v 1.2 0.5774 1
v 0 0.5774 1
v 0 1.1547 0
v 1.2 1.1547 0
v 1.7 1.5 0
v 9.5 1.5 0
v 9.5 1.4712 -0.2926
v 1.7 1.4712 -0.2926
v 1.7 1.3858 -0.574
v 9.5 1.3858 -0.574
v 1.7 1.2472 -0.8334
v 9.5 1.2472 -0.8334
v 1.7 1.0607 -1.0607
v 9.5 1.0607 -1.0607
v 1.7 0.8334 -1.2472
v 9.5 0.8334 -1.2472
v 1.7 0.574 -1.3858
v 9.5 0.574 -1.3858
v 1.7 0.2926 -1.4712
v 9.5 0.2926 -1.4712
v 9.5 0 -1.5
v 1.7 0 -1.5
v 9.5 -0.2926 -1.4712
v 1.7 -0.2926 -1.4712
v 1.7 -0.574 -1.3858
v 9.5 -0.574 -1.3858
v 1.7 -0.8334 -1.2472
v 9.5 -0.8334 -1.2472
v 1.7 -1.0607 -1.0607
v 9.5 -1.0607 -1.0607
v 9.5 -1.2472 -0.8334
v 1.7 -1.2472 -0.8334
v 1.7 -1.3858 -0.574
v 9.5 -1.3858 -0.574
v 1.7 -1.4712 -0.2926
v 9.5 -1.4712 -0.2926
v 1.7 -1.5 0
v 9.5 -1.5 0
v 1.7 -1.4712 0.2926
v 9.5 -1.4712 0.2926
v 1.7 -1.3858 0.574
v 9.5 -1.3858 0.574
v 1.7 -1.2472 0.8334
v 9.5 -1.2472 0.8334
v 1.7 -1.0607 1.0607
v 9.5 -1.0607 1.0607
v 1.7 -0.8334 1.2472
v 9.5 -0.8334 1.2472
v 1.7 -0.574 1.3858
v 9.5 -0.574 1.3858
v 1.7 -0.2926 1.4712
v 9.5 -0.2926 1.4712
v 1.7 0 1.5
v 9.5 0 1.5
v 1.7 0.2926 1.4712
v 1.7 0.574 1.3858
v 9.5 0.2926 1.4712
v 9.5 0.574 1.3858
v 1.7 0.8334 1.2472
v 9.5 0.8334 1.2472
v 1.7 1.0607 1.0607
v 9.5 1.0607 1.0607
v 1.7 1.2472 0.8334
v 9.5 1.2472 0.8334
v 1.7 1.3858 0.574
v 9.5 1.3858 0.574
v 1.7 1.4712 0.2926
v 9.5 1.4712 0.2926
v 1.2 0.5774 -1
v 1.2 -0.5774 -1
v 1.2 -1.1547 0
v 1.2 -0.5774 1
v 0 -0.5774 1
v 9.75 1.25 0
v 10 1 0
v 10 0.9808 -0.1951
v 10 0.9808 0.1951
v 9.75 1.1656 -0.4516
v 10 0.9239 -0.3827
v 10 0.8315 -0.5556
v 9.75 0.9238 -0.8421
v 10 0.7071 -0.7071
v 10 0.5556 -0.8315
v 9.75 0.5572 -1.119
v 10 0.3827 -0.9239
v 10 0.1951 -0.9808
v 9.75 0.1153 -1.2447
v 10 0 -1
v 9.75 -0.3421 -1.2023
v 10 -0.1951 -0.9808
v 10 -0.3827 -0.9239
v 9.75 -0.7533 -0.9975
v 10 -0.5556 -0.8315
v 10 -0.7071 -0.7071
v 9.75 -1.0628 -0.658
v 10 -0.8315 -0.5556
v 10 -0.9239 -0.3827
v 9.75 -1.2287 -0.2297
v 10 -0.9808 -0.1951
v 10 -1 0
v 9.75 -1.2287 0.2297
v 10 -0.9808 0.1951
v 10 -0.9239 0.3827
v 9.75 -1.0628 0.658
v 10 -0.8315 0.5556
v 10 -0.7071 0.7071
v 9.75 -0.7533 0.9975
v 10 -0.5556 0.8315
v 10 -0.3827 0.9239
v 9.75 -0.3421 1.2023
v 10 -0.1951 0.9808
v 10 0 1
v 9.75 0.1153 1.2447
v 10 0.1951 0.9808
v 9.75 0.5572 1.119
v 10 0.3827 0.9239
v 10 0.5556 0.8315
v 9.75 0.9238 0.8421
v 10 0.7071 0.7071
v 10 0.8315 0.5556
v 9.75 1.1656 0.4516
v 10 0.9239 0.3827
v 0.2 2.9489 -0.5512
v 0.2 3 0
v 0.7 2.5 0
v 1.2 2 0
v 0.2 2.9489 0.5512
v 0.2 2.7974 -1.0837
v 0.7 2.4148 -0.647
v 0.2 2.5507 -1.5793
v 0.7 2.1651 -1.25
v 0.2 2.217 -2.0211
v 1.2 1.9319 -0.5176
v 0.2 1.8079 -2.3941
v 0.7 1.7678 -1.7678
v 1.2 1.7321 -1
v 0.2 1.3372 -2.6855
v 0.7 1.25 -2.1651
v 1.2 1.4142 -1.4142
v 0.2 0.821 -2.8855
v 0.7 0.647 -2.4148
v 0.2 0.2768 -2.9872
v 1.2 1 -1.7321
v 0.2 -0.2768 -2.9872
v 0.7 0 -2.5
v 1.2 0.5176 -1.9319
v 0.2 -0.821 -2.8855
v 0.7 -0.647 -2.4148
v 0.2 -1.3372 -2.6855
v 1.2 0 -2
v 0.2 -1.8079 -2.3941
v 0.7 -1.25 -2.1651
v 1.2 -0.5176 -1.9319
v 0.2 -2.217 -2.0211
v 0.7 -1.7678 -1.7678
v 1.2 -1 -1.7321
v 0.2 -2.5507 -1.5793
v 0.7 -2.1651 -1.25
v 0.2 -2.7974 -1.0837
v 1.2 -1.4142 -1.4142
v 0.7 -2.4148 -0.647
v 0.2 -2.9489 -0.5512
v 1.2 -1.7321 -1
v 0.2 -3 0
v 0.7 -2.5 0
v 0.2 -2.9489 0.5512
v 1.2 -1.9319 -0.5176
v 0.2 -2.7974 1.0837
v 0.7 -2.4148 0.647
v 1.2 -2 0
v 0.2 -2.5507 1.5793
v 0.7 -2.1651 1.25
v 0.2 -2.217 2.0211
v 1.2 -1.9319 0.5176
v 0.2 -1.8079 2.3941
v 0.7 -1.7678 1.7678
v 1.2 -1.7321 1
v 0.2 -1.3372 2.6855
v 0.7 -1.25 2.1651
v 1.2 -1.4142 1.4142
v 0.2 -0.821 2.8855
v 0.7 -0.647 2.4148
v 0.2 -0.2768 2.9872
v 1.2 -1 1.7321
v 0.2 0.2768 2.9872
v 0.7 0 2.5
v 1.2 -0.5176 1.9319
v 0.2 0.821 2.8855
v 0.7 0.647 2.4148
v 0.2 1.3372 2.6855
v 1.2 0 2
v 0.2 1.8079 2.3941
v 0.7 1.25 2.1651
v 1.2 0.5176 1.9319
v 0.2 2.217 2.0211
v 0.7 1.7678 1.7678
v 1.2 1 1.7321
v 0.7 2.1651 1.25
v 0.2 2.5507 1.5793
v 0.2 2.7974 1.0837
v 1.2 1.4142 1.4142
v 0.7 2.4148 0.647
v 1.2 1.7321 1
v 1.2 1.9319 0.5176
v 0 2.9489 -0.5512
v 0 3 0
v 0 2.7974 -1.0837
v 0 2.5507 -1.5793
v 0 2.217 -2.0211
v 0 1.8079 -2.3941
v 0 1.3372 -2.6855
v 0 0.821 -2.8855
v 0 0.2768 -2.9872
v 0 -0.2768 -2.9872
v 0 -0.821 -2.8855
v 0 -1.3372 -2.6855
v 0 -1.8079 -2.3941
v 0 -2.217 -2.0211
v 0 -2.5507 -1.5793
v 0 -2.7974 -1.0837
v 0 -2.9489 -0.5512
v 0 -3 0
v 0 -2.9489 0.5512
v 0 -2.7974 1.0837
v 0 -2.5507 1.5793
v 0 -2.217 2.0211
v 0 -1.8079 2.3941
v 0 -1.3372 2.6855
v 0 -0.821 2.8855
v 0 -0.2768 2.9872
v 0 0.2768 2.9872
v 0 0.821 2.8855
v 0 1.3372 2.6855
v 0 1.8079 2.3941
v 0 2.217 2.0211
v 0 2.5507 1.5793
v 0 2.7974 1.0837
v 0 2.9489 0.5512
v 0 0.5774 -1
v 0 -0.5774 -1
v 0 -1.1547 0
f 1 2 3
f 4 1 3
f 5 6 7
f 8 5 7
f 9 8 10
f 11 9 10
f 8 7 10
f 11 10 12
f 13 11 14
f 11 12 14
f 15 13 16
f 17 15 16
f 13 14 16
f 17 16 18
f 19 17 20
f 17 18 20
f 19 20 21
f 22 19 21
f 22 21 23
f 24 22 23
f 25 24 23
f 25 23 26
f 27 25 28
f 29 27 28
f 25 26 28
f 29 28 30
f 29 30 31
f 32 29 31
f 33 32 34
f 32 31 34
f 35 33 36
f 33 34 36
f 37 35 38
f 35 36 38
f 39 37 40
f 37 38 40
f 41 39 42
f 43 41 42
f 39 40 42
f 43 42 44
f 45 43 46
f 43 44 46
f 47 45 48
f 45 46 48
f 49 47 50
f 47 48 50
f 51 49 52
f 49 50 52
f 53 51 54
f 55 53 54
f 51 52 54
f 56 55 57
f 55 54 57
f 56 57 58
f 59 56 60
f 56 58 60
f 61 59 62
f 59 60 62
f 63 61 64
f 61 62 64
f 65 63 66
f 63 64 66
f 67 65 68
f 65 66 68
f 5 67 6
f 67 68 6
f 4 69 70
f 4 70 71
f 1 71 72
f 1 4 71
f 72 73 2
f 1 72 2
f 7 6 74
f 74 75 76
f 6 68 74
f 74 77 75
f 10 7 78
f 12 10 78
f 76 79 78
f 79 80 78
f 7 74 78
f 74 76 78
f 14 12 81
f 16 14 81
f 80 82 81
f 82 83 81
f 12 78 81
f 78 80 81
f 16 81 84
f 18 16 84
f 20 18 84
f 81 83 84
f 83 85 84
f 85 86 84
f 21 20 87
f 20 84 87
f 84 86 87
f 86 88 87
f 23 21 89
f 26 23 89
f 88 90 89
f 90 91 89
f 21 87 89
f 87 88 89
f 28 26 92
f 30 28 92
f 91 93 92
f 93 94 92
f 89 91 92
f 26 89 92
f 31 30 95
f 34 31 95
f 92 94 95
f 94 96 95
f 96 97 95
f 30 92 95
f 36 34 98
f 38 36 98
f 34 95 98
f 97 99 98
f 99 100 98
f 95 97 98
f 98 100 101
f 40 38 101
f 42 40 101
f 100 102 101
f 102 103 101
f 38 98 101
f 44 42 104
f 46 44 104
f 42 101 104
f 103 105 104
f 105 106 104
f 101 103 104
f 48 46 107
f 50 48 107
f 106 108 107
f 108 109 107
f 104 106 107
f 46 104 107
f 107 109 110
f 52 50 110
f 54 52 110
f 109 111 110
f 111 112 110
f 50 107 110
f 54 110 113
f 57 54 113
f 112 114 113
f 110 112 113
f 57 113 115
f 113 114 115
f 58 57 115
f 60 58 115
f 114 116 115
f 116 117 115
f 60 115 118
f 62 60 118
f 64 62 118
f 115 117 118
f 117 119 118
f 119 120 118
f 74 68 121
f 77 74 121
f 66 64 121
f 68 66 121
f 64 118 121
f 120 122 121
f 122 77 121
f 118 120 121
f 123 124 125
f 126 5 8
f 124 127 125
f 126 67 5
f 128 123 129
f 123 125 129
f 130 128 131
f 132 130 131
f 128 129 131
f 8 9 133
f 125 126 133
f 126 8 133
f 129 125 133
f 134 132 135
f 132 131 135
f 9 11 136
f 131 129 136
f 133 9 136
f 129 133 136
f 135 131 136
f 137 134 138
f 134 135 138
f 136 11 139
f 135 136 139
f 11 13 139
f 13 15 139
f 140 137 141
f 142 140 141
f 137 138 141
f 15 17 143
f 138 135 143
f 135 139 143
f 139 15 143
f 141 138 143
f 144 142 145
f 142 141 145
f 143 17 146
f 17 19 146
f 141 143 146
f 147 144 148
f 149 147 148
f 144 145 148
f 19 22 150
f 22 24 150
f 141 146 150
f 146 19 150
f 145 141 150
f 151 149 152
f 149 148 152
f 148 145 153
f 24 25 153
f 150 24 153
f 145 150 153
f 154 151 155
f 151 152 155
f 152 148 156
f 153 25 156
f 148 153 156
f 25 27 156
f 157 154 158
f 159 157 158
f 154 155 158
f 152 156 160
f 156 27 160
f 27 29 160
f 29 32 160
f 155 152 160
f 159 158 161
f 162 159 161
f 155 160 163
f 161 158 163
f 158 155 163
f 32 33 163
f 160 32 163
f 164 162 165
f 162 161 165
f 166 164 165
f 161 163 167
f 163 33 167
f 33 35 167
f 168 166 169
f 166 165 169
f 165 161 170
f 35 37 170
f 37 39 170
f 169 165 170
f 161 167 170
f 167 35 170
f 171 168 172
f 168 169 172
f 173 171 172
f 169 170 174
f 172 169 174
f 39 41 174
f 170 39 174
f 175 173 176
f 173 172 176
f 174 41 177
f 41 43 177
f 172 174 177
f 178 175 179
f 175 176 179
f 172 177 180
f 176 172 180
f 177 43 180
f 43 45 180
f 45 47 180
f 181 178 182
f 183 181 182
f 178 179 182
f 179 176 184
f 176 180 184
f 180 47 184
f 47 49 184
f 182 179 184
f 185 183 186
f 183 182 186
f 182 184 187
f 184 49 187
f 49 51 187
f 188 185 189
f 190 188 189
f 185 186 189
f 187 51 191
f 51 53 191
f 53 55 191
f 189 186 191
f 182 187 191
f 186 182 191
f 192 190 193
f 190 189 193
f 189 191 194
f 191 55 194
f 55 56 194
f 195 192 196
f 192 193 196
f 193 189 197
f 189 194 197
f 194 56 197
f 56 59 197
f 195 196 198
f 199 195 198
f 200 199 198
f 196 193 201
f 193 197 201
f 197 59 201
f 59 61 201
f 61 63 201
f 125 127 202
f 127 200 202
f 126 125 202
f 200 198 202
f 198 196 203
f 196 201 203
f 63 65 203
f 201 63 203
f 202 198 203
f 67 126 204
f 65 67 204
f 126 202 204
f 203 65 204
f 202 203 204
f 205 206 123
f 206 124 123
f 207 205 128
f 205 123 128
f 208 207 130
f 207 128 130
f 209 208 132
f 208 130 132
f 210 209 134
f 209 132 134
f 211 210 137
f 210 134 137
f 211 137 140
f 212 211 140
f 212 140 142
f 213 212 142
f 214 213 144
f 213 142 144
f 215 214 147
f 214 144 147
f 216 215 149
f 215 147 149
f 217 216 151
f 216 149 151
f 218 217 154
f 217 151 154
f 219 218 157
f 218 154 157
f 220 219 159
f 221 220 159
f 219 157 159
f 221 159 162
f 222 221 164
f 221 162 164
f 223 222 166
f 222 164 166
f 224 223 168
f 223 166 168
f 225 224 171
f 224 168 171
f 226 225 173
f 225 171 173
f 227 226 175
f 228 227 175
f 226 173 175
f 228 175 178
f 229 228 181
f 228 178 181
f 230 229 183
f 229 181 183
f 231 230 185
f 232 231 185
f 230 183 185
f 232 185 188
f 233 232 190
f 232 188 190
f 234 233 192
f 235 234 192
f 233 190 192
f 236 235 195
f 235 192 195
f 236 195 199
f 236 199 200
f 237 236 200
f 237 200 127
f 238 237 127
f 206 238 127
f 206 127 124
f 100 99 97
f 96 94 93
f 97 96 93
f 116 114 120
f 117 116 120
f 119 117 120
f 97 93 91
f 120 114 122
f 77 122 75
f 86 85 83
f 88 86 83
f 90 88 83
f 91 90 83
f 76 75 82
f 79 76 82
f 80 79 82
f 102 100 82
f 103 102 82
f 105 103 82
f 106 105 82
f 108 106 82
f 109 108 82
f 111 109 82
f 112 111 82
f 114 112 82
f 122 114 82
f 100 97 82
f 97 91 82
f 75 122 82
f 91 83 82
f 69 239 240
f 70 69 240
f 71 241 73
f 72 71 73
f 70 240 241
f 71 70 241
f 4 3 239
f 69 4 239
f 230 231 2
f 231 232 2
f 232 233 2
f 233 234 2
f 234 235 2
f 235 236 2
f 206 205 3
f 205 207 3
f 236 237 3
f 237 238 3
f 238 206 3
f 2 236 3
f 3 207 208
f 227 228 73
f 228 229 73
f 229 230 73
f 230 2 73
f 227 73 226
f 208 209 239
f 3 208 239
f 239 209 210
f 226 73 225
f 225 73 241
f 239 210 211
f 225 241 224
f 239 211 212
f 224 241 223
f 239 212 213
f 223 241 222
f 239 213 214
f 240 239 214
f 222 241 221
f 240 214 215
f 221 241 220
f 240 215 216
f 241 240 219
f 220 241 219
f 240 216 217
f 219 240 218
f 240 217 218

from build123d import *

# Parameters (mm, degrees)
CHANFREIN1_SIZE         = 0.5
ENL_V_MAT_EXTRU_1_DEPTH = 1.2


with BuildPart() as part:
    # Esquisse1 → Révolution1 (revolve)
    with BuildSketch(Plane.XY):
        Polygon((0, 0), (0, 3), (0.2, 3), (1.7, 1.5), (10, 1.5), (10, 0), align=None)
    revolve(axis=Axis((10, 0, 0), (-1, 0, 0)))

    # Chanfrein1
    chanfrein1_edges = [part.edges().sort_by_distance(p)[0] for p in [
        (10, -1.5, 0),
    ]]
    chamfer(chanfrein1_edges, length=CHANFREIN1_SIZE)

    # Esquisse2 → Enlèv. mat.-Extru.1 (cut)
    with BuildSketch(Plane.ZY):
        Polygon((0, 1.154700538), (-1, 0.577350269), (-1, -0.577350269), (0, -1.154700538), (1, -0.577350269), (1, 0.577350269), align=None)
    extrude(amount=-ENL_V_MAT_EXTRU_1_DEPTH, mode=Mode.SUBTRACT)


solid = part.part
